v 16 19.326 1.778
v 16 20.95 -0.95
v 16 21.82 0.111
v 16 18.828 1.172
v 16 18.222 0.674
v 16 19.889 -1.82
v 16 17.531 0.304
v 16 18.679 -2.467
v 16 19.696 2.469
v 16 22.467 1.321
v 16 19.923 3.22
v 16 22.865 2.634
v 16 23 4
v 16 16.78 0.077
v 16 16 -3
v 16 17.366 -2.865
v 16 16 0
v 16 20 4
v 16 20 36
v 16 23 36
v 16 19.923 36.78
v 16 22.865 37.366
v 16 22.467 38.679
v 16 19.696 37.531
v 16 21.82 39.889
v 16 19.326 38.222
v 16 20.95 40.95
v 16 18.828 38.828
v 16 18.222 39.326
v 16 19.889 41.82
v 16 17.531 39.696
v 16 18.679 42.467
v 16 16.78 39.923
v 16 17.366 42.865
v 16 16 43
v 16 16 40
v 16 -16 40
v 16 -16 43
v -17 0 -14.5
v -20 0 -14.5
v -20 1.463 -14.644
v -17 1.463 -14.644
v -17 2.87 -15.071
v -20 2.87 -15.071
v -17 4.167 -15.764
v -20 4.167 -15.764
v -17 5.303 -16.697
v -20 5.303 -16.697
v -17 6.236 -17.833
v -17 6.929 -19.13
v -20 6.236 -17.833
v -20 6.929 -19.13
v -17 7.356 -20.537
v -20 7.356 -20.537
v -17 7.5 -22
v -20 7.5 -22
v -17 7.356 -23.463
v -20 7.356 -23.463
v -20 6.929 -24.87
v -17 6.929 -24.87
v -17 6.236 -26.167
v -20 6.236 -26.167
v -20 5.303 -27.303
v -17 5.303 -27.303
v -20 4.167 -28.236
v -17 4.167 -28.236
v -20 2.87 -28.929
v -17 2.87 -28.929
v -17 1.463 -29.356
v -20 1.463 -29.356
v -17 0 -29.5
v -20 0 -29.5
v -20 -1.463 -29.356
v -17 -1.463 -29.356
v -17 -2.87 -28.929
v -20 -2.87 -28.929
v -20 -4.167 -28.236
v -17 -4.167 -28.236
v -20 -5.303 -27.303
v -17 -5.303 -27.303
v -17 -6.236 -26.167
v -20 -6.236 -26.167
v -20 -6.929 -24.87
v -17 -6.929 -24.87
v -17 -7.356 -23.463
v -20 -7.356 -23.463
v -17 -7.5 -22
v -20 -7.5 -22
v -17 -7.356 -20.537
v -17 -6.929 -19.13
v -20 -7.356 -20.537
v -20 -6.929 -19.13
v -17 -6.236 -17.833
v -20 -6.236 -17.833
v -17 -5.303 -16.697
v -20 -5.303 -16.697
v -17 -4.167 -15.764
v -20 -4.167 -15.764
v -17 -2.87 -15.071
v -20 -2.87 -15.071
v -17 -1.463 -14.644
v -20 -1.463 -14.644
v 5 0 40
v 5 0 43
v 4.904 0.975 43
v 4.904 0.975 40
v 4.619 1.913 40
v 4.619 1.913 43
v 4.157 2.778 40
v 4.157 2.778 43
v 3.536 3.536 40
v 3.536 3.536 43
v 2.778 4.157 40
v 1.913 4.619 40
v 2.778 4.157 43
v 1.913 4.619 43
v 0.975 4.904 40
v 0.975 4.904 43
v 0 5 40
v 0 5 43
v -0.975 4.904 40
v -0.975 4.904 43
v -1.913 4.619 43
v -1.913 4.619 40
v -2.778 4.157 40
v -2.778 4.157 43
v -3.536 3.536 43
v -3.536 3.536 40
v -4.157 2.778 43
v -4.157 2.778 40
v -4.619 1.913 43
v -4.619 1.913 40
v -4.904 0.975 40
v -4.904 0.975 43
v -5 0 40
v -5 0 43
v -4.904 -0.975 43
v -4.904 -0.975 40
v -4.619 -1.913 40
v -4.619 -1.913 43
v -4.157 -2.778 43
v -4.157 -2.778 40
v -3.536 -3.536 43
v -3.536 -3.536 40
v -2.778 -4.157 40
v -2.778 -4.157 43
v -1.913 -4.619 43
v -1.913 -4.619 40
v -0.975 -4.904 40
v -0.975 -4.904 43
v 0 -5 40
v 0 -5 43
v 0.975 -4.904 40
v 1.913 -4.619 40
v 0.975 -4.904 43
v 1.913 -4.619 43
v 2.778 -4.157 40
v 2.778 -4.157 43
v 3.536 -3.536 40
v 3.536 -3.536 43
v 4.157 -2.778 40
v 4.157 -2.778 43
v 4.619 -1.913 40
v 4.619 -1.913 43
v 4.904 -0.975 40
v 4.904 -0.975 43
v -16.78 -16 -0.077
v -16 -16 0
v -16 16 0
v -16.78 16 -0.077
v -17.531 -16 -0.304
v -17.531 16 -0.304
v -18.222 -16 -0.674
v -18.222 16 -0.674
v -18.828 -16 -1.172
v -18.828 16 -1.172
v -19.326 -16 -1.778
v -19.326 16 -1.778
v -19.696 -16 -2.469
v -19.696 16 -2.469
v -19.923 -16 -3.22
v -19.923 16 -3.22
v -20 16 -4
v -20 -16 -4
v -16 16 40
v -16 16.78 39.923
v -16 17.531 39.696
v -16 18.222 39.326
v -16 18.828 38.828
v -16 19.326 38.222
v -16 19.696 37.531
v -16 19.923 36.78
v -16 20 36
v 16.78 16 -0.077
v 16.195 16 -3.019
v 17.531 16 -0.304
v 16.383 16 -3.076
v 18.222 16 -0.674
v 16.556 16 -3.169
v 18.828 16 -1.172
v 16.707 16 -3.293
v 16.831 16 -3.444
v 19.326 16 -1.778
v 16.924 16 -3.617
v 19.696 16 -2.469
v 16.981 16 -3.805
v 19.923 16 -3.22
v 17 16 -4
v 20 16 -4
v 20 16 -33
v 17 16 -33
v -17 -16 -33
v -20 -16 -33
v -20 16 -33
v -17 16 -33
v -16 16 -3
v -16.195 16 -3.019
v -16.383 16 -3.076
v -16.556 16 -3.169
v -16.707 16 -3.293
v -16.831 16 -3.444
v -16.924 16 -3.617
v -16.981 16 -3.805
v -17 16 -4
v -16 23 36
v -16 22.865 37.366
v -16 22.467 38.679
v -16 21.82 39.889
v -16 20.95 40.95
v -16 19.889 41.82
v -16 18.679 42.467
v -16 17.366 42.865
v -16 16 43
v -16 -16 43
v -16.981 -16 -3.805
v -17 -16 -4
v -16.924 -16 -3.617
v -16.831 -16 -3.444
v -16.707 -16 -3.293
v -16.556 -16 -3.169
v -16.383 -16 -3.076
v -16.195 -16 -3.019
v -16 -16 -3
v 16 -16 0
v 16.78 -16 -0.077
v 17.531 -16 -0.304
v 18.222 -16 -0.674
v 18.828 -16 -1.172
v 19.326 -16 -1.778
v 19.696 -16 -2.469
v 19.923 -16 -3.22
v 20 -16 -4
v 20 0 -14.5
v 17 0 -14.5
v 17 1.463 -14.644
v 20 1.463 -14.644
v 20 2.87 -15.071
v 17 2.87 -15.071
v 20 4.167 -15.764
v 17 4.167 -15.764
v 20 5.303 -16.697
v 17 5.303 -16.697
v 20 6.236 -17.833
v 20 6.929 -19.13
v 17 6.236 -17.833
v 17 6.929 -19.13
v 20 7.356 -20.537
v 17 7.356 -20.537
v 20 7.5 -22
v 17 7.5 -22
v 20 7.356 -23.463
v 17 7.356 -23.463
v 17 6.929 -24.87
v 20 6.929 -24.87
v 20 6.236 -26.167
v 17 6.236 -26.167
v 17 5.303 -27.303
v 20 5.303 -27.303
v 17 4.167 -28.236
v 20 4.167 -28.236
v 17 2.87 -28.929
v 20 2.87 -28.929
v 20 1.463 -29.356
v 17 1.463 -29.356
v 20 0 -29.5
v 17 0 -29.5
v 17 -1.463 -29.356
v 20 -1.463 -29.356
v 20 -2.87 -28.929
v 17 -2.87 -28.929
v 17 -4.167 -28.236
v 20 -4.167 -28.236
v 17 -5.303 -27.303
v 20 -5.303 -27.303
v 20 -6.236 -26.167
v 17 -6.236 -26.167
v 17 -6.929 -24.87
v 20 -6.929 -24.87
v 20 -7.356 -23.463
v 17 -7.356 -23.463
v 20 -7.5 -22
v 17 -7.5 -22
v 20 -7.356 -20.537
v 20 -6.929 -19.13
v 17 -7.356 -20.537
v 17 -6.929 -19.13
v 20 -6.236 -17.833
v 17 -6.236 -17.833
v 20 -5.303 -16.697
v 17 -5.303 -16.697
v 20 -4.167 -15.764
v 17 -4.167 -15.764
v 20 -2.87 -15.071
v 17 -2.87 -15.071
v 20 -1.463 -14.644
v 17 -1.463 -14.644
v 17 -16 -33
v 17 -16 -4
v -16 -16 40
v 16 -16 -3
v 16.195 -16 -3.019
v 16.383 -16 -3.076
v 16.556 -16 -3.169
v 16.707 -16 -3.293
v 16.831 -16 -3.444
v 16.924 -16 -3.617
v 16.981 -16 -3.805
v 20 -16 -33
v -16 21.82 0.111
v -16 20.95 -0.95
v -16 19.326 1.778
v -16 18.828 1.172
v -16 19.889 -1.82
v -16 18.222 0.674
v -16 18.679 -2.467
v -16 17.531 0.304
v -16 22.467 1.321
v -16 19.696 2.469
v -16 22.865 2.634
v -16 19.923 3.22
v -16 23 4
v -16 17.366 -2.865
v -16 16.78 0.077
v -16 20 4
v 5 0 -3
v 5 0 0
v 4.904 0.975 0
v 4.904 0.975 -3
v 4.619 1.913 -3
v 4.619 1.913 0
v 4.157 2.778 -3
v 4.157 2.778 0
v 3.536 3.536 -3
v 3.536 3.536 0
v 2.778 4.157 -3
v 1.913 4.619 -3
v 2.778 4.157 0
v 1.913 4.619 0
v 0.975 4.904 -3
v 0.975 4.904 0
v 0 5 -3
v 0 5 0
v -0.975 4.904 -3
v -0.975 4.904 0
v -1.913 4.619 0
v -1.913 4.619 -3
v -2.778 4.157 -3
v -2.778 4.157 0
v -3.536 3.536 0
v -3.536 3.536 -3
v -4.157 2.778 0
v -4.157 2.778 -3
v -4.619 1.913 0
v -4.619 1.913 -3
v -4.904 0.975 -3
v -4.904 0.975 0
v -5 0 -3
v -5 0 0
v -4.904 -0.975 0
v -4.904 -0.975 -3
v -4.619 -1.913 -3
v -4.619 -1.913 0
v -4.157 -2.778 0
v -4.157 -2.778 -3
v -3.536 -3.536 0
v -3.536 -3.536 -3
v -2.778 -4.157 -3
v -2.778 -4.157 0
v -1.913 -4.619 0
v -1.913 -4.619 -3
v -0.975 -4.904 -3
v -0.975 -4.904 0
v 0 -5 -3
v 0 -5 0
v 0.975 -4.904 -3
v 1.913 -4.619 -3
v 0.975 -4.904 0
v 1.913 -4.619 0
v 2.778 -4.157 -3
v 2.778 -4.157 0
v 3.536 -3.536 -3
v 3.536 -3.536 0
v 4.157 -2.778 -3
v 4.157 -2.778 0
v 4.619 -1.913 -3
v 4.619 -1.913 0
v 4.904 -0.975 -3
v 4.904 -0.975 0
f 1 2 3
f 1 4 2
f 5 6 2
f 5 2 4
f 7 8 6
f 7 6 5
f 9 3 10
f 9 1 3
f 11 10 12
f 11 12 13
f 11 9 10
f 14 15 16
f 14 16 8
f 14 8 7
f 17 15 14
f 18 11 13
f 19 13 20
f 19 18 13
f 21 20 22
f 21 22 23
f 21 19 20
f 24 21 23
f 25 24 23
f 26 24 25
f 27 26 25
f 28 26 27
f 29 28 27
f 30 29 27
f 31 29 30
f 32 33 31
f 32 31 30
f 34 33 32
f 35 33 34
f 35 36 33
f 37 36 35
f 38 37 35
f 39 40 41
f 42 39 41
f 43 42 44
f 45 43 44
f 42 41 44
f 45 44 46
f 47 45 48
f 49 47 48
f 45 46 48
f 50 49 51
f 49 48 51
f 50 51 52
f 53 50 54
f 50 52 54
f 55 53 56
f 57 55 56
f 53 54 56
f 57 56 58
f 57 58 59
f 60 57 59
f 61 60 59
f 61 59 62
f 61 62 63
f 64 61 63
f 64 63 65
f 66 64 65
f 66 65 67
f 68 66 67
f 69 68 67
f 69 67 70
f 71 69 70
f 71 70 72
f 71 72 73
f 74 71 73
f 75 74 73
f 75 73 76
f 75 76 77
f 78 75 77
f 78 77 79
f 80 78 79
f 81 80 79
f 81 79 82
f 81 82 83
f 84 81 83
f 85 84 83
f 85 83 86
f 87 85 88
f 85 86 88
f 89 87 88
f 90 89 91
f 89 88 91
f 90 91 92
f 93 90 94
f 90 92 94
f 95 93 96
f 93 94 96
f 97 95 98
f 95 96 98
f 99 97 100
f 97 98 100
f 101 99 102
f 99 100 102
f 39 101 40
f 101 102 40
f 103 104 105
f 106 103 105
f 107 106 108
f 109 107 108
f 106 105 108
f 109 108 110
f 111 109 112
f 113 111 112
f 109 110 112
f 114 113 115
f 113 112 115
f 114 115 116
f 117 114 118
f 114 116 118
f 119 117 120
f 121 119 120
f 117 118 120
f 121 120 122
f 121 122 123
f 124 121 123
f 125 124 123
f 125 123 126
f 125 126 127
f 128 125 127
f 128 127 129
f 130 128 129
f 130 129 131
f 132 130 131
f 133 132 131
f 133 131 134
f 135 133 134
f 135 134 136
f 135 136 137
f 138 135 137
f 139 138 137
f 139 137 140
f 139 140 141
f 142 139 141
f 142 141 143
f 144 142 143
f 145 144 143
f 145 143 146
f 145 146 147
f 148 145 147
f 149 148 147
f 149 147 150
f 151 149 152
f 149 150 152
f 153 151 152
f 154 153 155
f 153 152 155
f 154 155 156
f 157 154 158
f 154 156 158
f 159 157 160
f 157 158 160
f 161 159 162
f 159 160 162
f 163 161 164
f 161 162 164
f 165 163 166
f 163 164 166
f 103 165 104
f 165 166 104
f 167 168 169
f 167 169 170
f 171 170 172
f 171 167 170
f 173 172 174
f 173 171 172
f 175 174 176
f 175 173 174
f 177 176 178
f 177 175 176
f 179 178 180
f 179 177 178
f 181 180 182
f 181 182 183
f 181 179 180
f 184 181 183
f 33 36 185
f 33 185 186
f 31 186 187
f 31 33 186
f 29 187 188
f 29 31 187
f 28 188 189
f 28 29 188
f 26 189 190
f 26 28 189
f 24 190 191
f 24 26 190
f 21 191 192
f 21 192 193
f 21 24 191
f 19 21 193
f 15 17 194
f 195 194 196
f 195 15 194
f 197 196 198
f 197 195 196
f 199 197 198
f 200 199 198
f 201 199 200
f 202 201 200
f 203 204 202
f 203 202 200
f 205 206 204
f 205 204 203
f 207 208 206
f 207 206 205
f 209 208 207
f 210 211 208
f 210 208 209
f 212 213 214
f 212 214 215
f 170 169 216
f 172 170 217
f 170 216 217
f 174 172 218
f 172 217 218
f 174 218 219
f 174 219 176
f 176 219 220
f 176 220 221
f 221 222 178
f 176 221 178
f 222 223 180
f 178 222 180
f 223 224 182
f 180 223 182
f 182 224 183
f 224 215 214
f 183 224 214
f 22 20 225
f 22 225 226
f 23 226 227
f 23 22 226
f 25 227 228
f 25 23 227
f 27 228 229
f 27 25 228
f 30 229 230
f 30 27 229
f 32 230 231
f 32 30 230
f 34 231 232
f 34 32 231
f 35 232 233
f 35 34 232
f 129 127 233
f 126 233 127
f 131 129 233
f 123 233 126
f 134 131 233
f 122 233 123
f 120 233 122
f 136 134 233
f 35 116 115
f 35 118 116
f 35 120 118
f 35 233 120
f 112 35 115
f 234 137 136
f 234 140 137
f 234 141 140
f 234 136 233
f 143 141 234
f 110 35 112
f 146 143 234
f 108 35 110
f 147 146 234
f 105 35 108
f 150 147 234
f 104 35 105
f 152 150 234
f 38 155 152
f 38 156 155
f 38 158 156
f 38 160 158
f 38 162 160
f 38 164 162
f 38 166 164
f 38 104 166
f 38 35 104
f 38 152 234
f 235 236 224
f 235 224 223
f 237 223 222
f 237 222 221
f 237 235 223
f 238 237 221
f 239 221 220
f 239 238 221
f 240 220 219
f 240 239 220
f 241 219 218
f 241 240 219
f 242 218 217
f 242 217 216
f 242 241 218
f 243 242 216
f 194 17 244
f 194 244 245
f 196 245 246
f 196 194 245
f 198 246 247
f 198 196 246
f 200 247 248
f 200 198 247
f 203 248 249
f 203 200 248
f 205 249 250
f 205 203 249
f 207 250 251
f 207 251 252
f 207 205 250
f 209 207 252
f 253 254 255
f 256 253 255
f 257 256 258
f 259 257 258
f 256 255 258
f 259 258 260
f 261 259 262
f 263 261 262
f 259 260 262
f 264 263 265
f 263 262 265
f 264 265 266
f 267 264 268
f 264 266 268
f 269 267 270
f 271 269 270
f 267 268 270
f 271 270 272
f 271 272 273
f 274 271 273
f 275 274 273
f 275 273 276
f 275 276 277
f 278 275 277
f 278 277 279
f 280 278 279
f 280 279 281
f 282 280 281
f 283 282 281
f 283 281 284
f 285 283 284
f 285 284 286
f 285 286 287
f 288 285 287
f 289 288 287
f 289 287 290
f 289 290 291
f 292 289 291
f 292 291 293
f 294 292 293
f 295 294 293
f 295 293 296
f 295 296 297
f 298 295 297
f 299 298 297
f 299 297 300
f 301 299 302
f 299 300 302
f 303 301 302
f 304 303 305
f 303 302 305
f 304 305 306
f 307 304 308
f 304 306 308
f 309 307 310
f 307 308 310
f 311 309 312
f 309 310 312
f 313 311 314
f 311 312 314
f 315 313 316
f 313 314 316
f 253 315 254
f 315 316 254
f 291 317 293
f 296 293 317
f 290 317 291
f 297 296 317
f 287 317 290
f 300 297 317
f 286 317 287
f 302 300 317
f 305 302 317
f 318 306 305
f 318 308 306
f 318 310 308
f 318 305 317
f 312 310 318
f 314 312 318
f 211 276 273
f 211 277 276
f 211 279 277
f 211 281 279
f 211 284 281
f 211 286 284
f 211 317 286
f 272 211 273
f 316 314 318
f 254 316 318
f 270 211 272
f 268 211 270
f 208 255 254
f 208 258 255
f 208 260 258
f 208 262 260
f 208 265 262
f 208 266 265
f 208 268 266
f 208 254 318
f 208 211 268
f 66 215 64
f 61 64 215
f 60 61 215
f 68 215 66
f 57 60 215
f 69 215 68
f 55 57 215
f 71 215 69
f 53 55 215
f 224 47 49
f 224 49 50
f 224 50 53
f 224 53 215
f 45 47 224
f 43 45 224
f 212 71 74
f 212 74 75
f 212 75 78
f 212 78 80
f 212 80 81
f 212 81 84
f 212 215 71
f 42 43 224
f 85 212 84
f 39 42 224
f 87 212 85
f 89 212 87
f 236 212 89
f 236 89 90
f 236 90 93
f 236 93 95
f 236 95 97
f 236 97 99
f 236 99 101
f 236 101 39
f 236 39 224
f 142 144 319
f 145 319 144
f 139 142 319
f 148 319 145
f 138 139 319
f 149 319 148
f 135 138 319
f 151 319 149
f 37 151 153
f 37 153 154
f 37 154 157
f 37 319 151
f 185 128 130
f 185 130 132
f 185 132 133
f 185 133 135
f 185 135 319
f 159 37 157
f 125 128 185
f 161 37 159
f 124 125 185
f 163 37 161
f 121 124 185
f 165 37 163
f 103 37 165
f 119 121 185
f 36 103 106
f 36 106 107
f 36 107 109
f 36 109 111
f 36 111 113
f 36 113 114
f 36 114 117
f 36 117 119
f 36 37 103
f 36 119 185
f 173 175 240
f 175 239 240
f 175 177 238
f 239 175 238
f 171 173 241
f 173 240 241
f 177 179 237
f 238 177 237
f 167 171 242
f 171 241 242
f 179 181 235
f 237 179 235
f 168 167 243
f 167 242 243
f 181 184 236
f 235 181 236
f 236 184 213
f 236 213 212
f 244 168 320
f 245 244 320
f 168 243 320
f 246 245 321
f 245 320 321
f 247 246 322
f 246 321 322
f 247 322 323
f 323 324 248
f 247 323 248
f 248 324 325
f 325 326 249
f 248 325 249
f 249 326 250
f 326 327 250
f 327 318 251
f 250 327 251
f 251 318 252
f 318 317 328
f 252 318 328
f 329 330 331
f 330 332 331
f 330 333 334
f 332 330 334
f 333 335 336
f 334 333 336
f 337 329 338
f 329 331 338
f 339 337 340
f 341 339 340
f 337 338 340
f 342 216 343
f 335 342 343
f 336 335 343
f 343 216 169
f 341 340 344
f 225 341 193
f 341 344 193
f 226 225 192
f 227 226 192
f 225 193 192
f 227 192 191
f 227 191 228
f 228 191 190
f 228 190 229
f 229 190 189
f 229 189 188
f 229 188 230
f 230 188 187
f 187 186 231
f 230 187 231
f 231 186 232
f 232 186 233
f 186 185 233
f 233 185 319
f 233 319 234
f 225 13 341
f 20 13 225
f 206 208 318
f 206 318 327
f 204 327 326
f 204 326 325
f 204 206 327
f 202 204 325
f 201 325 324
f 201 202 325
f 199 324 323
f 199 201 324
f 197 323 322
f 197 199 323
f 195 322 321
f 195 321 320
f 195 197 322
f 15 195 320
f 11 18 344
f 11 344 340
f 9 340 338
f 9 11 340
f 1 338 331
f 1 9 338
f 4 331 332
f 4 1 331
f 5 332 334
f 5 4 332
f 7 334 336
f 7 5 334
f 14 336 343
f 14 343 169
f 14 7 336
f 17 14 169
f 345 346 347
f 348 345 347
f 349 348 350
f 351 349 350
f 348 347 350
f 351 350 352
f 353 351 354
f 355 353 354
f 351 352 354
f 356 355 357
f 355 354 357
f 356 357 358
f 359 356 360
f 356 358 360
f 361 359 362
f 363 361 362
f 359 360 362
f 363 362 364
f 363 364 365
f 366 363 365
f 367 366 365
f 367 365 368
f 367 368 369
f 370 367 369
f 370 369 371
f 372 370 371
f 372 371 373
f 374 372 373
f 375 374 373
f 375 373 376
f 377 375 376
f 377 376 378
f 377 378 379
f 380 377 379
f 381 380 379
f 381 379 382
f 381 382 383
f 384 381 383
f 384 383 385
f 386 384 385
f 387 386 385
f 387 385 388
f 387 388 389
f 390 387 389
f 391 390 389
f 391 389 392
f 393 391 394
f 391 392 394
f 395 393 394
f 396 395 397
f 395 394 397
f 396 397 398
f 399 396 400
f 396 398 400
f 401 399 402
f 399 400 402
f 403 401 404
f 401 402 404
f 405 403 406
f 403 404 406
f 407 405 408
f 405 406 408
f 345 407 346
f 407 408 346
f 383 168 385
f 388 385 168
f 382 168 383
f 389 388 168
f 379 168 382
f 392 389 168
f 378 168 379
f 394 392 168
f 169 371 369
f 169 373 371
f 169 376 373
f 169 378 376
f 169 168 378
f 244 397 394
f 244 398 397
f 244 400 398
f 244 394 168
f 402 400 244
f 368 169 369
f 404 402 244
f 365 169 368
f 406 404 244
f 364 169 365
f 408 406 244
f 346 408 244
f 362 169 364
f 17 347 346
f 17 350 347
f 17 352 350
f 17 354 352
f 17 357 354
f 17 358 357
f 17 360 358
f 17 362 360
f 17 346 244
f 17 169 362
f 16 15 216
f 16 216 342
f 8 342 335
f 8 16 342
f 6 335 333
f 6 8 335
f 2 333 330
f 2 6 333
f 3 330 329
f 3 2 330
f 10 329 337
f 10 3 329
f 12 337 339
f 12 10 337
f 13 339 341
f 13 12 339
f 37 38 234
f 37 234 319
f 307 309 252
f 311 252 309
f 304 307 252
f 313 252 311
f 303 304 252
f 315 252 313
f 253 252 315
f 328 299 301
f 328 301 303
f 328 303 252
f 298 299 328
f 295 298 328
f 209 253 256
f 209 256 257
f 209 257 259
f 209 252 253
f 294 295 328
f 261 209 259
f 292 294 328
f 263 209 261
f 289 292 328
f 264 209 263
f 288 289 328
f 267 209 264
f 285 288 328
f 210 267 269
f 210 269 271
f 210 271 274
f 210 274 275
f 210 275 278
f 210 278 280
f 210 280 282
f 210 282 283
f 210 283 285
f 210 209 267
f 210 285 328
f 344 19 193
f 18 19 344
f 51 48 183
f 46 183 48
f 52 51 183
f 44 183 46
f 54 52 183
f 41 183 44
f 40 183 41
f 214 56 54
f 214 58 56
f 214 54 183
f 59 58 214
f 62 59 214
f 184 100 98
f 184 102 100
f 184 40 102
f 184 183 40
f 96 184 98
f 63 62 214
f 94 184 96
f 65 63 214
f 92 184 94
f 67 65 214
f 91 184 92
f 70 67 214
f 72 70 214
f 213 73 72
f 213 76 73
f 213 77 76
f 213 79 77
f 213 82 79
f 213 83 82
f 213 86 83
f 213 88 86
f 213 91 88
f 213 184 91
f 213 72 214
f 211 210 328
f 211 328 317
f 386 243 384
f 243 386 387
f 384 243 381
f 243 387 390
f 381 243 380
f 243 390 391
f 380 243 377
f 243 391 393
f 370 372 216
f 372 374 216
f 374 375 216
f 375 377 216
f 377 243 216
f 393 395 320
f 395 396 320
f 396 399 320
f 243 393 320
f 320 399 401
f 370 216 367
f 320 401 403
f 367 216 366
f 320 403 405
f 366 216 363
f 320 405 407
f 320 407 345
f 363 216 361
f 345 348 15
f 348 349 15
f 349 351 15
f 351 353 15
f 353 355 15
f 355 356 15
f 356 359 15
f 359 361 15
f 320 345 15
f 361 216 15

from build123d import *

# Parameters (mm, degrees)
SKETCH1_W                      = 32
SKETCH1_H                      = 32
BASE_FLANGE1_DEPTH             = 3
KENAR_FLAN_1_DEPTH             = 32
KENAR_FLAN_2_DEPTH             = 32
KENAR_FLAN_3_DEPTH             = 32
KENAR_FLAN_4_DEPTH             = 32
SKETCH20_R                     = 5
CUT_EXTRUDE1_DEPTH             = 82.884064384
CUT_EXTRUDE2_REACH             = 65.071
SKETCH21_R                     = 7.5
CUT_EXTRUDE2_DIRECTION_2_DEPTH = 64.071388125


# Sheet-metal steps are written as plain solids
with BuildPart() as part:
    # Sketch1 → Base-Flange1 (new body)
    with BuildSketch(Plane.XY):
        Rectangle(SKETCH1_W, SKETCH1_H)
    extrude(amount=-BASE_FLANGE1_DEPTH)

    # Kenar-Flanş1 section (across the edge) → Kenar-Flanş1 (add)
    with BuildSketch(Plane(origin=(16, 20, 0), x_dir=(0, -1, 0), z_dir=(-1, 0, 0))):
        with BuildLine():
            Line((-3, 4), (-3, 36))
            Line((-3, 36), (0, 36))
            Line((0, 36), (0, 4))
            ThreePointArc((0, 4), (1.171572875, 1.171572875), (4, 0))
            Line((4, 0), (4, -3))
            ThreePointArc((4, -3), (-0.949747468, -0.949747468), (-3, 4))
        make_face()
    extrude(amount=KENAR_FLAN_1_DEPTH)

    # Kenar-Flanş2 section (across the edge) → Kenar-Flanş2 (add)
    with BuildSketch(Plane(origin=(16, 20, 40), x_dir=(0, 0, -1), z_dir=(-1, 0, 0))):
        with BuildLine():
            Line((-3, 4), (-3, 36))
            Line((-3, 36), (0, 36))
            Line((0, 36), (0, 4))
            ThreePointArc((0, 4), (1.171572875, 1.171572875), (4, 0))
            Line((4, 0), (4, -3))
            ThreePointArc((4, -3), (-0.949747468, -0.949747468), (-3, 4))
        make_face()
    extrude(amount=KENAR_FLAN_2_DEPTH)

    # Kenar-Flanş3 section (across the edge) → Kenar-Flanş3 (add)
    with BuildSketch(Plane(origin=(-17, -16, -3), x_dir=(1, 0, 0), z_dir=(0, 1, 0))):
        with BuildLine():
            Line((-3, 1), (-3, 30))
            Line((-3, 30), (0, 30))
            Line((0, 30), (0, 1))
            ThreePointArc((0, 1), (0.292893219, 0.292893219), (1, 0))
            Line((1, 0), (1, -3))
            ThreePointArc((1, -3), (-1.828427125, -1.828427125), (-3, 1))
        make_face()
    extrude(amount=KENAR_FLAN_3_DEPTH)

    # Kenar-Flanş4 section (across the edge) → Kenar-Flanş4 (add)
    with BuildSketch(Plane(origin=(17, 16, -3), x_dir=(-1, 0, 0), z_dir=(0, -1, 0))):
        with BuildLine():
            Line((-3, 1), (-3, 30))
            Line((-3, 30), (0, 30))
            Line((0, 30), (0, 1))
            ThreePointArc((0, 1), (0.292893219, 0.292893219), (1, 0))
            Line((1, 0), (1, -3))
            ThreePointArc((1, -3), (-1.828427125, -1.828427125), (-3, 1))
        make_face()
    extrude(amount=KENAR_FLAN_4_DEPTH)

    # Sketch20 → Cut-Extrude1 (cut, through all)
    with BuildSketch(Plane.XY.offset(43)):
        Circle(SKETCH20_R)
    extrude(amount=-CUT_EXTRUDE1_DEPTH, mode=Mode.SUBTRACT)

    # Cut-Extrude2: up to this face of the body (flat: up to its plane)
    cut_extrude2_end = Plane(part.part.faces().sort_by_distance((20, 0, -18.5))[0])
    # Sketch21 → Cut-Extrude2 (cut, up to the picked face)
    with BuildSketch(Plane.ZY.offset(20), mode=Mode.PRIVATE) as cut_extrude2_sk1:
        with Locations((-22, 0)):
            Circle(SKETCH21_R)
    cut_extrude2_tool1 = split(extrude(cut_extrude2_sk1.sketch, amount=-CUT_EXTRUDE2_REACH, mode=Mode.PRIVATE), bisect_by=cut_extrude2_end, keep=Keep.BOTH, mode=Mode.PRIVATE)
    add(cut_extrude2_tool1.solids().sort_by(Axis((-20, 0, -22), (1, 0, 0)))[0], mode=Mode.SUBTRACT)

    # Sketch21 → Cut-Extrude2 direction 2 (cut)
    with BuildSketch(Plane.ZY.offset(20)):
        with Locations((-22, 0)):
            Circle(SKETCH21_R)
    extrude(amount=CUT_EXTRUDE2_DIRECTION_2_DEPTH, mode=Mode.SUBTRACT)


solid = part.part
